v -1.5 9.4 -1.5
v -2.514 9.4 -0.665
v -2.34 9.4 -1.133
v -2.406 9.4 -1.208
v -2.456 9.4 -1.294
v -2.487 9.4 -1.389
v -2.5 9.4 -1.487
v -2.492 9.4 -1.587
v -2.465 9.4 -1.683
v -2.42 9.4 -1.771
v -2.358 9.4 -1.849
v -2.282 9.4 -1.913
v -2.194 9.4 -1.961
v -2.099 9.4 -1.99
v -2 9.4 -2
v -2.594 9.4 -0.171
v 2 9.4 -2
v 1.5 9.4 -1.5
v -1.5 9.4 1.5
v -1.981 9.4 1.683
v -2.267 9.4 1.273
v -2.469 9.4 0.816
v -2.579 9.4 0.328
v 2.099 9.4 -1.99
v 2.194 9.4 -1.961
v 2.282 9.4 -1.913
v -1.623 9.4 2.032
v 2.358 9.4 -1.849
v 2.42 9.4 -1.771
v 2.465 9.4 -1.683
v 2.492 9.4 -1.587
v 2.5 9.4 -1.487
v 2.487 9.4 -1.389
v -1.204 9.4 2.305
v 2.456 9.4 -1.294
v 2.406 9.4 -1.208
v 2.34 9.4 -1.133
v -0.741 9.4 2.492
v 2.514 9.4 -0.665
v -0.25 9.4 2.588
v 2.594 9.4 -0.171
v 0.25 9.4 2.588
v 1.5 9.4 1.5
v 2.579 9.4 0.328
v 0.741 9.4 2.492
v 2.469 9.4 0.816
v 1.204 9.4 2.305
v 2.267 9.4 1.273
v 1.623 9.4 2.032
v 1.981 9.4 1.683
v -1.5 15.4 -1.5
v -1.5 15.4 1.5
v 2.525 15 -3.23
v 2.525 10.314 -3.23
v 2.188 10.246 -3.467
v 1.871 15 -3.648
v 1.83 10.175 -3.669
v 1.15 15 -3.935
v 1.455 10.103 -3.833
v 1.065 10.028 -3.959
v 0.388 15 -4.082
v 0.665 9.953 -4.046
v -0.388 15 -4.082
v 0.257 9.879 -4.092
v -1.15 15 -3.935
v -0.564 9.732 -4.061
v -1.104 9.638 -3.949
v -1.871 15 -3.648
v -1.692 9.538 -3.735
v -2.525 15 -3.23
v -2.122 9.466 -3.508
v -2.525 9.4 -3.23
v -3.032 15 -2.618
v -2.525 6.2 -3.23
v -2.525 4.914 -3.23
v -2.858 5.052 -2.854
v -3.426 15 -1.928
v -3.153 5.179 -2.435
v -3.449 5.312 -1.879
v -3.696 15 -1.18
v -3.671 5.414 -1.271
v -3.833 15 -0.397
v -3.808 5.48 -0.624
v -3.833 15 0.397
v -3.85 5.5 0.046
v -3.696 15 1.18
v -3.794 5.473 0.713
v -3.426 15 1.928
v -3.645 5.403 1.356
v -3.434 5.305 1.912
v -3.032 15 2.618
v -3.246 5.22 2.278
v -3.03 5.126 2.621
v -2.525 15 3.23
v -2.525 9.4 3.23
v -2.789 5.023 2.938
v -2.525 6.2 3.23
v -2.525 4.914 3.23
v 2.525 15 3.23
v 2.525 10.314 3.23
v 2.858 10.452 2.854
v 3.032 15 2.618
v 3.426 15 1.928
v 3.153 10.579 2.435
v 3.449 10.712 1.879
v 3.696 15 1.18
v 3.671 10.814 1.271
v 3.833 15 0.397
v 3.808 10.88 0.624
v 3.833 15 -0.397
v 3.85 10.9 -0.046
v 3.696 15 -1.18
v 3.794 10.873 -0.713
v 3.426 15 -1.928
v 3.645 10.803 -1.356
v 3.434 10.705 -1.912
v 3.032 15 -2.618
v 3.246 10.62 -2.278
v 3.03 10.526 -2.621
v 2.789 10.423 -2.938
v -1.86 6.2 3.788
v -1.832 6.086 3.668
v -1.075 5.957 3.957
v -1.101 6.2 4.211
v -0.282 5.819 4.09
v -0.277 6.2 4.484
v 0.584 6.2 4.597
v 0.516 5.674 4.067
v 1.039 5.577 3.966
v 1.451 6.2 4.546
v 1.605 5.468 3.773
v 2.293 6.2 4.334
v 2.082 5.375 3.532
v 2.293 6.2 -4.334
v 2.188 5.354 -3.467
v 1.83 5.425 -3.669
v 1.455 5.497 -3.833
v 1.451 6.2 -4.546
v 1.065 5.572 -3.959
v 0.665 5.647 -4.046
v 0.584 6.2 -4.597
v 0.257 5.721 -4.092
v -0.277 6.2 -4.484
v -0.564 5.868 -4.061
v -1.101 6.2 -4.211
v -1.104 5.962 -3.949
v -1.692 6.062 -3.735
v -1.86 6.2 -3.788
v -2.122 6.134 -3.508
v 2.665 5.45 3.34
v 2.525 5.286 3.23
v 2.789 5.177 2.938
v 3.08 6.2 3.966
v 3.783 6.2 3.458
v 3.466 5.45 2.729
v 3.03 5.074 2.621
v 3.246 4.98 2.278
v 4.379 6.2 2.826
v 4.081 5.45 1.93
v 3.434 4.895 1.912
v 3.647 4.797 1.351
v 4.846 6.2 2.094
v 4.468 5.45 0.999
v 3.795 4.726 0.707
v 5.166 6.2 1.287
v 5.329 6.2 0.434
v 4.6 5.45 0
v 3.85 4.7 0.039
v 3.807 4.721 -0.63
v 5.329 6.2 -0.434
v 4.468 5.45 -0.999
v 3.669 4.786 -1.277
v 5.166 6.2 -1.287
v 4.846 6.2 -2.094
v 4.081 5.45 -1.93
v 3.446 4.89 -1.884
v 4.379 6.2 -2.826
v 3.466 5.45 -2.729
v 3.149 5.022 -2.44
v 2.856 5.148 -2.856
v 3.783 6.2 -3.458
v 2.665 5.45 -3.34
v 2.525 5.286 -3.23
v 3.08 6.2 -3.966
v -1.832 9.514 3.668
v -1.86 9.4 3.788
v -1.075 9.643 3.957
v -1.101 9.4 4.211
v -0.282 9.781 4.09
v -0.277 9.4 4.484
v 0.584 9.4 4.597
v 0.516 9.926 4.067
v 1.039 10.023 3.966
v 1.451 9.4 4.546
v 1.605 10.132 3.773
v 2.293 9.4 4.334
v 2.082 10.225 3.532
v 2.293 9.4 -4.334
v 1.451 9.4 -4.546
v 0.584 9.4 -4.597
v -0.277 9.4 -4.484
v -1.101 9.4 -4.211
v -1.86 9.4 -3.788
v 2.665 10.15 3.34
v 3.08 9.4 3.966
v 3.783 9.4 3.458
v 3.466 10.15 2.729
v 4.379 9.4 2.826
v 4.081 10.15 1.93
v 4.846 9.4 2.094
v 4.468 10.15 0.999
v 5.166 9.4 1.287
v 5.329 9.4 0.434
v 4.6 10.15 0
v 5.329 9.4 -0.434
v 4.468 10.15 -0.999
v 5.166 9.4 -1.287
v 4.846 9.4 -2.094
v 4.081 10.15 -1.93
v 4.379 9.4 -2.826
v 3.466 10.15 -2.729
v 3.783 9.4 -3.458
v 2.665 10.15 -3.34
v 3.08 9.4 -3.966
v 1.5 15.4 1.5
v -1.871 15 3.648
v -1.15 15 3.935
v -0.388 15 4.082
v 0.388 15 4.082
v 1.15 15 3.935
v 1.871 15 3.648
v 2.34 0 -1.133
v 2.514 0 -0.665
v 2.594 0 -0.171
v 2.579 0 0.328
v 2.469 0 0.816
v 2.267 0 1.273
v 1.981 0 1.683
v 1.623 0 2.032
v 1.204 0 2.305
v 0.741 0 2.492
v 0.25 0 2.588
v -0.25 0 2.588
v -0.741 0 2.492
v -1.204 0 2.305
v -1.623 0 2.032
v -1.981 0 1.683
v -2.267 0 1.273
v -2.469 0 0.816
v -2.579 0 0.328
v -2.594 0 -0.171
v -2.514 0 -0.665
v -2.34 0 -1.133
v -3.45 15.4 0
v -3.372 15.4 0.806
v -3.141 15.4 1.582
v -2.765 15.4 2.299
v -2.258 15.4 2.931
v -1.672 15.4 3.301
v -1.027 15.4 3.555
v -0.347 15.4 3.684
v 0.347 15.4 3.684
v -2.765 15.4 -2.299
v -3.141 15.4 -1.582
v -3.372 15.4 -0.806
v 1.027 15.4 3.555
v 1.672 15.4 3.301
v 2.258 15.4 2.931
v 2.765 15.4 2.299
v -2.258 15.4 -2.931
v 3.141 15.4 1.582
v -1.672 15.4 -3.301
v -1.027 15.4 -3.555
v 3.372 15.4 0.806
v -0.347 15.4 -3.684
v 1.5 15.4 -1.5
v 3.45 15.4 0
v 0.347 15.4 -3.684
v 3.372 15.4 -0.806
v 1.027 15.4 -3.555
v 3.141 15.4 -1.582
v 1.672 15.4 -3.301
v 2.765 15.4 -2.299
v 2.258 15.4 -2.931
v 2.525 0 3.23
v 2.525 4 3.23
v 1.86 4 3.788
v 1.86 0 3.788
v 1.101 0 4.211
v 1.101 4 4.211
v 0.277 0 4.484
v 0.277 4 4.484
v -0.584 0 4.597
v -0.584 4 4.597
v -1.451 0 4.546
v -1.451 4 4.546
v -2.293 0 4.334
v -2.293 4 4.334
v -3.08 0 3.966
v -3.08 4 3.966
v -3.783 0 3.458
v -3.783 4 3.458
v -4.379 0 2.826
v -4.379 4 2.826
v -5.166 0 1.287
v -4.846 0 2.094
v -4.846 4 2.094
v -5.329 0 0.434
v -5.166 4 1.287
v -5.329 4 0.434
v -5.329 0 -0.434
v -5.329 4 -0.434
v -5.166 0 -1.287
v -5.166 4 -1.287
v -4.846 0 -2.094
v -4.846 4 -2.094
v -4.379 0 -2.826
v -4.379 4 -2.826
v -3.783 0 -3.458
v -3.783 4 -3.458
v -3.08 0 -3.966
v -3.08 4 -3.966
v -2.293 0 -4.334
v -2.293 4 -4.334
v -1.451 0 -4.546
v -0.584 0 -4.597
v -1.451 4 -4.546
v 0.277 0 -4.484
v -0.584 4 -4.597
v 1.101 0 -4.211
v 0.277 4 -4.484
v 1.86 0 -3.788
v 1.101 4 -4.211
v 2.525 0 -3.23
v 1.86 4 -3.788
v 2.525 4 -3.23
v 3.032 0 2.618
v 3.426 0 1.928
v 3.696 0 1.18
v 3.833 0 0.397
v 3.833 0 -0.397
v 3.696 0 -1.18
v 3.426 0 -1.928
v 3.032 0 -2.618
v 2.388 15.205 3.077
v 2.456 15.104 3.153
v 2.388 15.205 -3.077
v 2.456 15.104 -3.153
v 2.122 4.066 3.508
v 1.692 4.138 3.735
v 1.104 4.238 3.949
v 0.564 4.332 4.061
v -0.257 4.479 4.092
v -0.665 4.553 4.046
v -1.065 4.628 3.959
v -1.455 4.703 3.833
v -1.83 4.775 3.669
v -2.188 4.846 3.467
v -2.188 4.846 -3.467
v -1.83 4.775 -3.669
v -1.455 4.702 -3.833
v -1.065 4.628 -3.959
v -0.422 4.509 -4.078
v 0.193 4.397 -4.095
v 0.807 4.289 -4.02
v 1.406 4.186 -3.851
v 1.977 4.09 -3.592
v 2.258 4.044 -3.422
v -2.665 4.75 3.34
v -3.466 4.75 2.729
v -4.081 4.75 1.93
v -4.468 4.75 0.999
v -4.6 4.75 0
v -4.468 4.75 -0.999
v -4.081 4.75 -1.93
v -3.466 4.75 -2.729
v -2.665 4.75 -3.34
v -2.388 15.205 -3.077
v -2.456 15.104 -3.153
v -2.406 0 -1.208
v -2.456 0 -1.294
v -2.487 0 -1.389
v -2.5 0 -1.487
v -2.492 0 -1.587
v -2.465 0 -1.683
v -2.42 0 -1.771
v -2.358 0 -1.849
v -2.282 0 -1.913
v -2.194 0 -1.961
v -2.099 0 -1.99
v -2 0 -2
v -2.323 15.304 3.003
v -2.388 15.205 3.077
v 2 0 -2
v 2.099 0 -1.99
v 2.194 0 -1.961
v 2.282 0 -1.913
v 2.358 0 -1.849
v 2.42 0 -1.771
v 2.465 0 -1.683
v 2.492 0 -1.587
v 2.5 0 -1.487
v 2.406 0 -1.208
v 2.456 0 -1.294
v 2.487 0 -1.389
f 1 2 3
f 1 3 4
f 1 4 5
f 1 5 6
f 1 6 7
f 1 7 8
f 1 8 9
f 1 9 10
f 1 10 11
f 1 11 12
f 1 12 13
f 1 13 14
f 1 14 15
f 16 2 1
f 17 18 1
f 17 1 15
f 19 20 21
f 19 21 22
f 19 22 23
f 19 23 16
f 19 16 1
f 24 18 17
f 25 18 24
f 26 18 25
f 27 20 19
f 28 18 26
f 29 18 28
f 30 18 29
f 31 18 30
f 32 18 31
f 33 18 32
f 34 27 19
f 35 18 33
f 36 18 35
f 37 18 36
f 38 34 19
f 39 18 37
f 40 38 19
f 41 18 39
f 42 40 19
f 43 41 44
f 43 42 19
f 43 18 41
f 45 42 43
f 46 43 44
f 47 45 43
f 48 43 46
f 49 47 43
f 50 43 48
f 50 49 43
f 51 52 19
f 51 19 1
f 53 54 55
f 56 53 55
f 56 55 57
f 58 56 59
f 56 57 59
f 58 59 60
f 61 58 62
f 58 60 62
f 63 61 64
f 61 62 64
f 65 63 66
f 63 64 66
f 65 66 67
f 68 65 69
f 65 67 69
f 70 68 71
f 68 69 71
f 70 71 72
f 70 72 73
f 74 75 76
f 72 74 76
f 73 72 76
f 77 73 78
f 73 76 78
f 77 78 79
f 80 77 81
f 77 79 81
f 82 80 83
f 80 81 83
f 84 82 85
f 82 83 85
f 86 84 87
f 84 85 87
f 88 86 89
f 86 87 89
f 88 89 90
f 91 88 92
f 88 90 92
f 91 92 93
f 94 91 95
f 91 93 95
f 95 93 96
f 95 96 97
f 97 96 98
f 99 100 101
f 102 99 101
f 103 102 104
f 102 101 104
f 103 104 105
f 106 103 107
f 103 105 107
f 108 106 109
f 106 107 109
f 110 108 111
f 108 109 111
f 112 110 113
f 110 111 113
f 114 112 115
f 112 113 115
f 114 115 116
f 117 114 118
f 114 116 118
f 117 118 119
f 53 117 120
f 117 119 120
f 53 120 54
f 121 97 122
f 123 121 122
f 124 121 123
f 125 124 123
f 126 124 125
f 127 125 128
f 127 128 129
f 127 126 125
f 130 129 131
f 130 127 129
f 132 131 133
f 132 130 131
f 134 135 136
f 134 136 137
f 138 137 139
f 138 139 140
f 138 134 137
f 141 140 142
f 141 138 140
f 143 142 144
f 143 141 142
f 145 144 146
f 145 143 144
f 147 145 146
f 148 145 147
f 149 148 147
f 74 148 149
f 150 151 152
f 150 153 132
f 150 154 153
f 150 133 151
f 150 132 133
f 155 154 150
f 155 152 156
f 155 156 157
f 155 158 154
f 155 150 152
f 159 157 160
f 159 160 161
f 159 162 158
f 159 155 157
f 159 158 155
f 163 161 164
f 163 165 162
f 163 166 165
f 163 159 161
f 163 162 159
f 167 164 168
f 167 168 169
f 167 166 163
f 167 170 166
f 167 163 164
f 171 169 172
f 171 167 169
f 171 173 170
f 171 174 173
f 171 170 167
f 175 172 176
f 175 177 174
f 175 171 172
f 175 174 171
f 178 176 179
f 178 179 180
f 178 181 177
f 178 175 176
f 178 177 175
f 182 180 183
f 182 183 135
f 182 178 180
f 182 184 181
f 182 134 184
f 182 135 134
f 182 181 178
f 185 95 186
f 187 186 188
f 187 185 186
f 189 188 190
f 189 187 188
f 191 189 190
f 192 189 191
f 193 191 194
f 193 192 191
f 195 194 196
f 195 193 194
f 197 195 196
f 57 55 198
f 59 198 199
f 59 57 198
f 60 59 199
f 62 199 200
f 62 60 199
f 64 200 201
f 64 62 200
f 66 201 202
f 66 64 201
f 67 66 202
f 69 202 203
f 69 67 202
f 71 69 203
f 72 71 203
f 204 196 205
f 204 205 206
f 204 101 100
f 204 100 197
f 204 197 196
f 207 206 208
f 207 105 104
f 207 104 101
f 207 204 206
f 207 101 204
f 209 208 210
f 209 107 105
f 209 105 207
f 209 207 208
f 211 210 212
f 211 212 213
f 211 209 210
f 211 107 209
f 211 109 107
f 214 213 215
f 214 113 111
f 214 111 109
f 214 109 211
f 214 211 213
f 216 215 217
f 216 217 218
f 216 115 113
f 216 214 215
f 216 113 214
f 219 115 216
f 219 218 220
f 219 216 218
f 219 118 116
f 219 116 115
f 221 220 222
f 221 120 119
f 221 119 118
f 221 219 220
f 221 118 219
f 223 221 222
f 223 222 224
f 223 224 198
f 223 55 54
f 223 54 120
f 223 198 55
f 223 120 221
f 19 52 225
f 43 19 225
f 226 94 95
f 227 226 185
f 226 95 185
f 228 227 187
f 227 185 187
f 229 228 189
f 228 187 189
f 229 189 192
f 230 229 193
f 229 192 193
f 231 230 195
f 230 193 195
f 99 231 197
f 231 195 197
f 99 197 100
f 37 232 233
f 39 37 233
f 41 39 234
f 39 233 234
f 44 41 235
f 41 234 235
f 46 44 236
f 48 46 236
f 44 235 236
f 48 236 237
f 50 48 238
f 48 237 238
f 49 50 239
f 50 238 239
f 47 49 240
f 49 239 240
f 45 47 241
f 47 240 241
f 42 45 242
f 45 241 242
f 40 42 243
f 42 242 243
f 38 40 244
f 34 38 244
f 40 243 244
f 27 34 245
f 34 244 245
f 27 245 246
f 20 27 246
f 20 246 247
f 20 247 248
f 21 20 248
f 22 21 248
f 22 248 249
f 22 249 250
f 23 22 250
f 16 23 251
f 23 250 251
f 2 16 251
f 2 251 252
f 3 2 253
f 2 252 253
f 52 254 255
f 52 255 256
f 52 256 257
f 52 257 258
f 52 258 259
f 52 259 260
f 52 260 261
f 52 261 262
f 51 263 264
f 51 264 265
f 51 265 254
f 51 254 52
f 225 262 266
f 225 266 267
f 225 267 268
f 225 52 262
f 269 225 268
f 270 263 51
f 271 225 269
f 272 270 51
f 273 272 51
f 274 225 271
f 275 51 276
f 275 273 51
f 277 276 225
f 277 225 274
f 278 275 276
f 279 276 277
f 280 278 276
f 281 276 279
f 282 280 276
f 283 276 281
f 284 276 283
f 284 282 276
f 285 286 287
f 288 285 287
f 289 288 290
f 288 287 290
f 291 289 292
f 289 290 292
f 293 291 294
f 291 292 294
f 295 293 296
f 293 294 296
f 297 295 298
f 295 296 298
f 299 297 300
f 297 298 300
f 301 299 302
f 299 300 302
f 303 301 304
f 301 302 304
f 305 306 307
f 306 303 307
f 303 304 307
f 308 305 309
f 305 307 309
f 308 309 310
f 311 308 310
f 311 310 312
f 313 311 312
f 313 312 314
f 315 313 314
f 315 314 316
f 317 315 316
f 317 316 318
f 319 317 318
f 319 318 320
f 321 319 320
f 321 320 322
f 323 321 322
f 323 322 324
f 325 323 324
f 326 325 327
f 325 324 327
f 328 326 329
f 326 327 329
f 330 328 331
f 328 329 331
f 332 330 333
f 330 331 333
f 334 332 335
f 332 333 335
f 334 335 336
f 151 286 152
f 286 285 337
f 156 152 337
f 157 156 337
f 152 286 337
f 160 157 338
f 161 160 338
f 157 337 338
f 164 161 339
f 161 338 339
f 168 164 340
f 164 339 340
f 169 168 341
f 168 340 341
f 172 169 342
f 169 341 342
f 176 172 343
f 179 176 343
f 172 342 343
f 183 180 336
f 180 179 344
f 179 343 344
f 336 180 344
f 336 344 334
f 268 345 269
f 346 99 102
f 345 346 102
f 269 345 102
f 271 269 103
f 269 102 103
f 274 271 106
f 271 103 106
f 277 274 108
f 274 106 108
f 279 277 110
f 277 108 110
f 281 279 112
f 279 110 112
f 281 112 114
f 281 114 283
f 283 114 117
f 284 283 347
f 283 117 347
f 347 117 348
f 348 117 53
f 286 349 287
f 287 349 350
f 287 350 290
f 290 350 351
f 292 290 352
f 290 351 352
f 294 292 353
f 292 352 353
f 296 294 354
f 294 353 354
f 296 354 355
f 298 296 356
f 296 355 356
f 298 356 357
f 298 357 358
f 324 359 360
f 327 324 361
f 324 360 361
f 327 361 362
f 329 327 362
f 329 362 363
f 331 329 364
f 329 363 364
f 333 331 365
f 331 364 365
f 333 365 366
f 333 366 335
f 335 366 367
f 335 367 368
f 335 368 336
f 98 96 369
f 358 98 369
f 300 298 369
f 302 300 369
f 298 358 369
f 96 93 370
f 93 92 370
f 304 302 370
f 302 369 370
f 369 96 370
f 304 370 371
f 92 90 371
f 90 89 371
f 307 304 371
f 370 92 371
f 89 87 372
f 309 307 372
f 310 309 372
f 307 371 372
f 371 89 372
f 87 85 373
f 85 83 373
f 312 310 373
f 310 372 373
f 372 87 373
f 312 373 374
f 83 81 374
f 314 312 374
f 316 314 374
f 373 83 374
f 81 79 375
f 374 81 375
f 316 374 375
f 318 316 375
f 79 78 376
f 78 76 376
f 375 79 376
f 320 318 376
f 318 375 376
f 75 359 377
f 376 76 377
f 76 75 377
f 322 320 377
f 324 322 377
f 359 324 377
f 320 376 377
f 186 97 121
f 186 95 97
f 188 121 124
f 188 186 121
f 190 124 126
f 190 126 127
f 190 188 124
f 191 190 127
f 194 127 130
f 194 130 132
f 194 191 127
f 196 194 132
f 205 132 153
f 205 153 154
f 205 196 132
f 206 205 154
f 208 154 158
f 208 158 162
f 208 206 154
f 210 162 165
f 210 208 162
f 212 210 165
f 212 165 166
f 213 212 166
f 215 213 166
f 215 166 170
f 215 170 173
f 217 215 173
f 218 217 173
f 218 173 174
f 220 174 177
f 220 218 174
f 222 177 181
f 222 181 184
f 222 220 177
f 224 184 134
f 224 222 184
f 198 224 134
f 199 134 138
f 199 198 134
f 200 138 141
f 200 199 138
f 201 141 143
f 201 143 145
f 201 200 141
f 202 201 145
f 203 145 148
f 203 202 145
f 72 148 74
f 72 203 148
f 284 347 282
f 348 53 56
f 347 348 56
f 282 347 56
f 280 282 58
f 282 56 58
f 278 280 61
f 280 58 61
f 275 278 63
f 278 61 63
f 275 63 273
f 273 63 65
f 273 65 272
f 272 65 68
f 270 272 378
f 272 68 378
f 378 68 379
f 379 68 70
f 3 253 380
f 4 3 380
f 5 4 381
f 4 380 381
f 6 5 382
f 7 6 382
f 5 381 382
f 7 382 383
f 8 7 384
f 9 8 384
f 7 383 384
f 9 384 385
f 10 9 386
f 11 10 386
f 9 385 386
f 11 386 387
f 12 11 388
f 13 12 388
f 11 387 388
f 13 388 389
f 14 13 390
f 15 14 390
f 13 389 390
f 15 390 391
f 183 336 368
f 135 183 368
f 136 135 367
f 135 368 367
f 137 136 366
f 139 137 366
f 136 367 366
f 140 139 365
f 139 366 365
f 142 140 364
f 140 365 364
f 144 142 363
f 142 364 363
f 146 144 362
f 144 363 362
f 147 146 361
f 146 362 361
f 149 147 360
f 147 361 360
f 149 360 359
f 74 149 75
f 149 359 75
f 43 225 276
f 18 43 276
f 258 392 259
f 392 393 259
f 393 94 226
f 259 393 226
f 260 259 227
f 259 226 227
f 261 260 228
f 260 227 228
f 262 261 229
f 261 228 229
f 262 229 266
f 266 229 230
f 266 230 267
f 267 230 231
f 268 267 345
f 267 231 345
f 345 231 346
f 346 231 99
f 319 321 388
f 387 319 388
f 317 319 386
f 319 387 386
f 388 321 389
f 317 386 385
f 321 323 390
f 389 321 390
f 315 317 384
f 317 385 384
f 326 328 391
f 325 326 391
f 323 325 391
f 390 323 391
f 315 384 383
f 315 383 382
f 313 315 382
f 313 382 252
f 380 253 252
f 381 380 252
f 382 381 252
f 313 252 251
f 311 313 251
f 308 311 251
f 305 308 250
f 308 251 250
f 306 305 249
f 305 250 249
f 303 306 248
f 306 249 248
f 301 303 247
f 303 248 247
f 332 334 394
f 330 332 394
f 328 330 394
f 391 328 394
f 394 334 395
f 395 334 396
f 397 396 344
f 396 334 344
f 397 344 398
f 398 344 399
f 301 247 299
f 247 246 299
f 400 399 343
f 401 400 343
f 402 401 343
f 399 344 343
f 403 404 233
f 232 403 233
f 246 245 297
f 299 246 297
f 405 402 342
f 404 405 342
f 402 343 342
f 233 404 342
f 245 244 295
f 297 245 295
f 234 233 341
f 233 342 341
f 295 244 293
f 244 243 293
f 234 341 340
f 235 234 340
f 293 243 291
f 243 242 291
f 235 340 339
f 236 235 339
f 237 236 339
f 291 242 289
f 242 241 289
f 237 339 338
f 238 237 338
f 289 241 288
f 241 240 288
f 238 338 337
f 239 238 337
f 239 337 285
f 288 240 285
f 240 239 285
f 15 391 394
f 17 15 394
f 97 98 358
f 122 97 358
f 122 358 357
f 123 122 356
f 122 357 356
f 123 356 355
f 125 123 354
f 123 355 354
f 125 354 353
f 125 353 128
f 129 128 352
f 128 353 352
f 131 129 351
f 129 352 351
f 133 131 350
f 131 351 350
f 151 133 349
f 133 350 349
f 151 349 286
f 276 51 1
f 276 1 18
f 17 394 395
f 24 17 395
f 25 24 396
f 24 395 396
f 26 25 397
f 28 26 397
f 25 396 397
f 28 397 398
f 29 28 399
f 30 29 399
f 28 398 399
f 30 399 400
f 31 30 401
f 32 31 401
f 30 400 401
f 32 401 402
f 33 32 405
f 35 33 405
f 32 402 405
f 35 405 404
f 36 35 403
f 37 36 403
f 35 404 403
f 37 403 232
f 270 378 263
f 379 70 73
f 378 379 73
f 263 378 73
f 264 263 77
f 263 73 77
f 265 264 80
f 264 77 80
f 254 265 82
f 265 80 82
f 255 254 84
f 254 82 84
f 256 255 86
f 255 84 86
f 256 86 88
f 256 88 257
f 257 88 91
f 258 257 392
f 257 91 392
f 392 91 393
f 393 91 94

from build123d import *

# Parameters (mm, degrees)
BOSS_EXTRUDE1_DEPTH = 15.4
CUT_EXTRUDE1_DEPTH  = 9.4
CUT_EXTRUDE2_REACH  = 18.939
SKETCH5_W           = 3
SKETCH5_H           = 3
CHAMFER1_SIZE       = 0.4


with BuildPart() as part:
    # Sketch1 → Boss-Extrude1 (new body)
    with BuildSketch(Plane(origin=(0, 0, 0), x_dir=(1, 0, 0), z_dir=(0, 1, 0))):
        with BuildLine():
            ThreePointArc((-2.525, -3.23022832), (0, -4.1), (2.525, -3.23022832))
            ThreePointArc((2.525, -3.23022832), (3.85, 0), (2.525, 3.23022832))
            ThreePointArc((2.525, 3.23022832), (0, 4.1), (-2.525, 3.23022832))
            ThreePointArc((-2.525, 3.23022832), (-3.85, 0), (-2.525, -3.23022832))
        make_face()
    extrude(amount=BOSS_EXTRUDE1_DEPTH)

    # Sketch2 → Revolve1 (revolve)
    with BuildSketch(Plane.XY, mode=Mode.PRIVATE) as revolve1_sk:
        Polygon((3.85, 0), (3.85, 4), (2.35, 5.5), (-0.75, 5.5), (-0.75, 0), align=None)
    revolve(revolve1_sk.sketch.rotate(Axis((-0.75, 5.5, 0), (0, -1, 0)), 270), axis=Axis((-0.75, 5.5, 0), (0, -1, 0)))

    # Sketch3 → Revolve2 (revolve)
    with BuildSketch(Plane.XY, mode=Mode.PRIVATE) as revolve2_sk:
        Polygon((0.75, 4.7), (-2.35, 4.7), (-3.85, 6.2), (-3.85, 9.4), (-2.35, 10.9), (0.75, 10.9), align=None)
    revolve(revolve2_sk.sketch.rotate(Axis((0.75, 4.7, 0), (0, 1, 0)), 315.394327097), axis=Axis((0.75, 4.7, 0), (0, 1, 0)))

    # Sketch4 → Cut-Extrude1 (cut)
    with BuildSketch(Plane.XZ):
        with BuildLine():
            Line((-2, -2), (2, -2))
            ThreePointArc((2, -2), (2.465465068, -1.682598659), (2.339973189, -1.133369081))
            ThreePointArc((2.339973189, -1.133369081), (0, 2.6), (-2.339973189, -1.133369081))
            ThreePointArc((-2.339973189, -1.133369081), (-2.465465068, -1.682598659), (-2, -2))
        make_face()
    extrude(amount=-CUT_EXTRUDE1_DEPTH, mode=Mode.SUBTRACT)

    # Sketch5 → Cut-Extrude2 (cut, up to next)
    with BuildSketch(Plane(origin=(0, 15.4, 0), x_dir=(1, 0, 0), z_dir=(0, 1, 0)), mode=Mode.PRIVATE) as cut_extrude2_sk1:
        Rectangle(SKETCH5_W, SKETCH5_H)
    cut_extrude2_tool1 = extrude(cut_extrude2_sk1.sketch, amount=-CUT_EXTRUDE2_REACH, mode=Mode.PRIVATE) & part.part
    add(cut_extrude2_tool1.solids().sort_by_distance((0, 15.4, 0))[0], mode=Mode.SUBTRACT)

    # Chamfer1
    # the kernel refuses this chamfer: 0.4 mm, written as the material it takes off along each edge
    with BuildSketch(Plane(origin=(0, 15.4, 0), x_dir=(-0.7922190522423981, 0, 0.6102368173620439), z_dir=(-0.6102368173620439, 0, -0.7922190522423981))) as chamfer1_piece_1:
        Polygon((4.1 - CHAMFER1_SIZE, 0), (4.1, -CHAMFER1_SIZE), (4.1, 0), align=None)
    revolve(axis=Axis((0, 15.4, 0), (0, 1, 0)), revolution_arc=104.786743256, mode=Mode.SUBTRACT)
    with BuildSketch(Plane(origin=(-0.75, 15.4, 0), x_dir=(0.5384255548923128, 0, 0.8426730812354843), z_dir=(-0.8426730812354843, 0, 0.5384255548923128))) as chamfer1_piece_2:
        Polygon((4.6 - CHAMFER1_SIZE, 0), (4.6, -CHAMFER1_SIZE), (4.6, 0), align=None)
    revolve(axis=Axis((-0.75, 15.4, 0), (0, 1, 0)), revolution_arc=114.846952535, mode=Mode.SUBTRACT)
    with BuildSketch(Plane(origin=(0, 15.4, 0), x_dir=(0.7922190522423987, 0, -0.610236817362043), z_dir=(0.610236817362043, 0, 0.7922190522423987))) as chamfer1_piece_3:
        Polygon((4.1 - CHAMFER1_SIZE, 0), (4.1, -CHAMFER1_SIZE), (4.1, 0), align=None)
    revolve(axis=Axis((0, 15.4, 0), (0, 1, 0)), revolution_arc=104.786743256, mode=Mode.SUBTRACT)
    with BuildSketch(Plane(origin=(0.75, 15.4, 0), x_dir=(-0.5384255548923127, 0, -0.8426730812354845), z_dir=(0.8426730812354845, 0, -0.5384255548923127))) as chamfer1_piece_4:
        Polygon((4.6 - CHAMFER1_SIZE, 0), (4.6, -CHAMFER1_SIZE), (4.6, 0), align=None)
    revolve(axis=Axis((0.75, 15.4, 0), (0, 1, 0)), revolution_arc=114.846952535, mode=Mode.SUBTRACT)


solid = part.part
